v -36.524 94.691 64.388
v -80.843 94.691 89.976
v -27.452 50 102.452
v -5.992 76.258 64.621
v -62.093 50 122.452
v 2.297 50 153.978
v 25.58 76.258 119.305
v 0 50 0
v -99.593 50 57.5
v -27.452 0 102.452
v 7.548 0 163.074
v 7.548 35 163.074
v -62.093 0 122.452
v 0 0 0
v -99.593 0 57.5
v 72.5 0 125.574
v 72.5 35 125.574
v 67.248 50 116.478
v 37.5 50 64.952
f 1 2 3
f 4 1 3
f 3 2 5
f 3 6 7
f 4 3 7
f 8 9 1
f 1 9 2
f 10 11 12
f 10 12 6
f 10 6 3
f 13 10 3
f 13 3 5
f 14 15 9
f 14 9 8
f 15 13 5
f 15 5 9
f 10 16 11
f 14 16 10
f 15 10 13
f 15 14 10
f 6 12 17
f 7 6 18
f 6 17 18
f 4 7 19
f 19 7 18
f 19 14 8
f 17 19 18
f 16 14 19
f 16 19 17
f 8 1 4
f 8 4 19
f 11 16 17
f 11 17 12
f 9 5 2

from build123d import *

# Parameters (mm, degrees)
EXTRUDE1_DEPTH     = 50
EXTRUDE2_DEPTH     = 115
EXTRUDE3_DEPTH     = 105
CUT_EXTRUDE1_DEPTH = 155
CUT_EXTRUDE2_DEPTH = 75


with BuildPart() as part:
    # Sketch1 → Extrude1 (new body)
    with BuildSketch(Plane(origin=(0, 0, 0), x_dir=(1, 0, 0), z_dir=(0, 1, 0))):
        Polygon((0, 0), (72.5, -125.573683549), (7.548094716, -163.073683549), (-27.451905284, -102.451905284), (-62.092921435, -122.451905284), (-99.592921435, -57.5), align=None)
    extrude(amount=EXTRUDE1_DEPTH)

    # Sketch2 → Extrude2 (add)
    with BuildSketch(Plane(origin=(-99.592921435, 0, 57.5), x_dir=(0.5, 0, 0.866025404), z_dir=(-0.866025404, 0, 0.5))):
        Polygon((75, 50), (0, 50), (37.5, 94.690759722), align=None)
    extrude(amount=-EXTRUDE2_DEPTH)

    # Sketch3 → Extrude3 (add)
    with BuildSketch(Plane(origin=(72.5, 0, 125.573683549), x_dir=(0.866025404, 0, -0.5), z_dir=(0.5, 0, 0.866025404))):
        Polygon((0, 50), (-75, 50), (-37.5, 76.257782683), align=None)
    extrude(amount=-EXTRUDE3_DEPTH)

    # Sketch4 → Cut-Extrude1 (cut)
    with BuildSketch(Plane(origin=(72.5, 0, 125.573683549), x_dir=(0.866025404, 0, -0.5), z_dir=(0.5, 0, 0.866025404))):
        Polygon((0, 50), (0, 113.526991311), (-90.725946016, 113.526991311), align=None)
    extrude(amount=-CUT_EXTRUDE1_DEPTH, mode=Mode.SUBTRACT)

    # Sketch5 → Cut-Extrude2 (cut)
    with BuildSketch(Plane(origin=(0, 0, 0), x_dir=(-0.5, 0, -0.866025404), z_dir=(0.866025404, 0, -0.5))):
        Polygon((-145, 35), (-97.861503451, 102.320749887), (-145, 102.320749887), align=None)
    extrude(amount=-CUT_EXTRUDE2_DEPTH, mode=Mode.SUBTRACT)


solid = part.part
